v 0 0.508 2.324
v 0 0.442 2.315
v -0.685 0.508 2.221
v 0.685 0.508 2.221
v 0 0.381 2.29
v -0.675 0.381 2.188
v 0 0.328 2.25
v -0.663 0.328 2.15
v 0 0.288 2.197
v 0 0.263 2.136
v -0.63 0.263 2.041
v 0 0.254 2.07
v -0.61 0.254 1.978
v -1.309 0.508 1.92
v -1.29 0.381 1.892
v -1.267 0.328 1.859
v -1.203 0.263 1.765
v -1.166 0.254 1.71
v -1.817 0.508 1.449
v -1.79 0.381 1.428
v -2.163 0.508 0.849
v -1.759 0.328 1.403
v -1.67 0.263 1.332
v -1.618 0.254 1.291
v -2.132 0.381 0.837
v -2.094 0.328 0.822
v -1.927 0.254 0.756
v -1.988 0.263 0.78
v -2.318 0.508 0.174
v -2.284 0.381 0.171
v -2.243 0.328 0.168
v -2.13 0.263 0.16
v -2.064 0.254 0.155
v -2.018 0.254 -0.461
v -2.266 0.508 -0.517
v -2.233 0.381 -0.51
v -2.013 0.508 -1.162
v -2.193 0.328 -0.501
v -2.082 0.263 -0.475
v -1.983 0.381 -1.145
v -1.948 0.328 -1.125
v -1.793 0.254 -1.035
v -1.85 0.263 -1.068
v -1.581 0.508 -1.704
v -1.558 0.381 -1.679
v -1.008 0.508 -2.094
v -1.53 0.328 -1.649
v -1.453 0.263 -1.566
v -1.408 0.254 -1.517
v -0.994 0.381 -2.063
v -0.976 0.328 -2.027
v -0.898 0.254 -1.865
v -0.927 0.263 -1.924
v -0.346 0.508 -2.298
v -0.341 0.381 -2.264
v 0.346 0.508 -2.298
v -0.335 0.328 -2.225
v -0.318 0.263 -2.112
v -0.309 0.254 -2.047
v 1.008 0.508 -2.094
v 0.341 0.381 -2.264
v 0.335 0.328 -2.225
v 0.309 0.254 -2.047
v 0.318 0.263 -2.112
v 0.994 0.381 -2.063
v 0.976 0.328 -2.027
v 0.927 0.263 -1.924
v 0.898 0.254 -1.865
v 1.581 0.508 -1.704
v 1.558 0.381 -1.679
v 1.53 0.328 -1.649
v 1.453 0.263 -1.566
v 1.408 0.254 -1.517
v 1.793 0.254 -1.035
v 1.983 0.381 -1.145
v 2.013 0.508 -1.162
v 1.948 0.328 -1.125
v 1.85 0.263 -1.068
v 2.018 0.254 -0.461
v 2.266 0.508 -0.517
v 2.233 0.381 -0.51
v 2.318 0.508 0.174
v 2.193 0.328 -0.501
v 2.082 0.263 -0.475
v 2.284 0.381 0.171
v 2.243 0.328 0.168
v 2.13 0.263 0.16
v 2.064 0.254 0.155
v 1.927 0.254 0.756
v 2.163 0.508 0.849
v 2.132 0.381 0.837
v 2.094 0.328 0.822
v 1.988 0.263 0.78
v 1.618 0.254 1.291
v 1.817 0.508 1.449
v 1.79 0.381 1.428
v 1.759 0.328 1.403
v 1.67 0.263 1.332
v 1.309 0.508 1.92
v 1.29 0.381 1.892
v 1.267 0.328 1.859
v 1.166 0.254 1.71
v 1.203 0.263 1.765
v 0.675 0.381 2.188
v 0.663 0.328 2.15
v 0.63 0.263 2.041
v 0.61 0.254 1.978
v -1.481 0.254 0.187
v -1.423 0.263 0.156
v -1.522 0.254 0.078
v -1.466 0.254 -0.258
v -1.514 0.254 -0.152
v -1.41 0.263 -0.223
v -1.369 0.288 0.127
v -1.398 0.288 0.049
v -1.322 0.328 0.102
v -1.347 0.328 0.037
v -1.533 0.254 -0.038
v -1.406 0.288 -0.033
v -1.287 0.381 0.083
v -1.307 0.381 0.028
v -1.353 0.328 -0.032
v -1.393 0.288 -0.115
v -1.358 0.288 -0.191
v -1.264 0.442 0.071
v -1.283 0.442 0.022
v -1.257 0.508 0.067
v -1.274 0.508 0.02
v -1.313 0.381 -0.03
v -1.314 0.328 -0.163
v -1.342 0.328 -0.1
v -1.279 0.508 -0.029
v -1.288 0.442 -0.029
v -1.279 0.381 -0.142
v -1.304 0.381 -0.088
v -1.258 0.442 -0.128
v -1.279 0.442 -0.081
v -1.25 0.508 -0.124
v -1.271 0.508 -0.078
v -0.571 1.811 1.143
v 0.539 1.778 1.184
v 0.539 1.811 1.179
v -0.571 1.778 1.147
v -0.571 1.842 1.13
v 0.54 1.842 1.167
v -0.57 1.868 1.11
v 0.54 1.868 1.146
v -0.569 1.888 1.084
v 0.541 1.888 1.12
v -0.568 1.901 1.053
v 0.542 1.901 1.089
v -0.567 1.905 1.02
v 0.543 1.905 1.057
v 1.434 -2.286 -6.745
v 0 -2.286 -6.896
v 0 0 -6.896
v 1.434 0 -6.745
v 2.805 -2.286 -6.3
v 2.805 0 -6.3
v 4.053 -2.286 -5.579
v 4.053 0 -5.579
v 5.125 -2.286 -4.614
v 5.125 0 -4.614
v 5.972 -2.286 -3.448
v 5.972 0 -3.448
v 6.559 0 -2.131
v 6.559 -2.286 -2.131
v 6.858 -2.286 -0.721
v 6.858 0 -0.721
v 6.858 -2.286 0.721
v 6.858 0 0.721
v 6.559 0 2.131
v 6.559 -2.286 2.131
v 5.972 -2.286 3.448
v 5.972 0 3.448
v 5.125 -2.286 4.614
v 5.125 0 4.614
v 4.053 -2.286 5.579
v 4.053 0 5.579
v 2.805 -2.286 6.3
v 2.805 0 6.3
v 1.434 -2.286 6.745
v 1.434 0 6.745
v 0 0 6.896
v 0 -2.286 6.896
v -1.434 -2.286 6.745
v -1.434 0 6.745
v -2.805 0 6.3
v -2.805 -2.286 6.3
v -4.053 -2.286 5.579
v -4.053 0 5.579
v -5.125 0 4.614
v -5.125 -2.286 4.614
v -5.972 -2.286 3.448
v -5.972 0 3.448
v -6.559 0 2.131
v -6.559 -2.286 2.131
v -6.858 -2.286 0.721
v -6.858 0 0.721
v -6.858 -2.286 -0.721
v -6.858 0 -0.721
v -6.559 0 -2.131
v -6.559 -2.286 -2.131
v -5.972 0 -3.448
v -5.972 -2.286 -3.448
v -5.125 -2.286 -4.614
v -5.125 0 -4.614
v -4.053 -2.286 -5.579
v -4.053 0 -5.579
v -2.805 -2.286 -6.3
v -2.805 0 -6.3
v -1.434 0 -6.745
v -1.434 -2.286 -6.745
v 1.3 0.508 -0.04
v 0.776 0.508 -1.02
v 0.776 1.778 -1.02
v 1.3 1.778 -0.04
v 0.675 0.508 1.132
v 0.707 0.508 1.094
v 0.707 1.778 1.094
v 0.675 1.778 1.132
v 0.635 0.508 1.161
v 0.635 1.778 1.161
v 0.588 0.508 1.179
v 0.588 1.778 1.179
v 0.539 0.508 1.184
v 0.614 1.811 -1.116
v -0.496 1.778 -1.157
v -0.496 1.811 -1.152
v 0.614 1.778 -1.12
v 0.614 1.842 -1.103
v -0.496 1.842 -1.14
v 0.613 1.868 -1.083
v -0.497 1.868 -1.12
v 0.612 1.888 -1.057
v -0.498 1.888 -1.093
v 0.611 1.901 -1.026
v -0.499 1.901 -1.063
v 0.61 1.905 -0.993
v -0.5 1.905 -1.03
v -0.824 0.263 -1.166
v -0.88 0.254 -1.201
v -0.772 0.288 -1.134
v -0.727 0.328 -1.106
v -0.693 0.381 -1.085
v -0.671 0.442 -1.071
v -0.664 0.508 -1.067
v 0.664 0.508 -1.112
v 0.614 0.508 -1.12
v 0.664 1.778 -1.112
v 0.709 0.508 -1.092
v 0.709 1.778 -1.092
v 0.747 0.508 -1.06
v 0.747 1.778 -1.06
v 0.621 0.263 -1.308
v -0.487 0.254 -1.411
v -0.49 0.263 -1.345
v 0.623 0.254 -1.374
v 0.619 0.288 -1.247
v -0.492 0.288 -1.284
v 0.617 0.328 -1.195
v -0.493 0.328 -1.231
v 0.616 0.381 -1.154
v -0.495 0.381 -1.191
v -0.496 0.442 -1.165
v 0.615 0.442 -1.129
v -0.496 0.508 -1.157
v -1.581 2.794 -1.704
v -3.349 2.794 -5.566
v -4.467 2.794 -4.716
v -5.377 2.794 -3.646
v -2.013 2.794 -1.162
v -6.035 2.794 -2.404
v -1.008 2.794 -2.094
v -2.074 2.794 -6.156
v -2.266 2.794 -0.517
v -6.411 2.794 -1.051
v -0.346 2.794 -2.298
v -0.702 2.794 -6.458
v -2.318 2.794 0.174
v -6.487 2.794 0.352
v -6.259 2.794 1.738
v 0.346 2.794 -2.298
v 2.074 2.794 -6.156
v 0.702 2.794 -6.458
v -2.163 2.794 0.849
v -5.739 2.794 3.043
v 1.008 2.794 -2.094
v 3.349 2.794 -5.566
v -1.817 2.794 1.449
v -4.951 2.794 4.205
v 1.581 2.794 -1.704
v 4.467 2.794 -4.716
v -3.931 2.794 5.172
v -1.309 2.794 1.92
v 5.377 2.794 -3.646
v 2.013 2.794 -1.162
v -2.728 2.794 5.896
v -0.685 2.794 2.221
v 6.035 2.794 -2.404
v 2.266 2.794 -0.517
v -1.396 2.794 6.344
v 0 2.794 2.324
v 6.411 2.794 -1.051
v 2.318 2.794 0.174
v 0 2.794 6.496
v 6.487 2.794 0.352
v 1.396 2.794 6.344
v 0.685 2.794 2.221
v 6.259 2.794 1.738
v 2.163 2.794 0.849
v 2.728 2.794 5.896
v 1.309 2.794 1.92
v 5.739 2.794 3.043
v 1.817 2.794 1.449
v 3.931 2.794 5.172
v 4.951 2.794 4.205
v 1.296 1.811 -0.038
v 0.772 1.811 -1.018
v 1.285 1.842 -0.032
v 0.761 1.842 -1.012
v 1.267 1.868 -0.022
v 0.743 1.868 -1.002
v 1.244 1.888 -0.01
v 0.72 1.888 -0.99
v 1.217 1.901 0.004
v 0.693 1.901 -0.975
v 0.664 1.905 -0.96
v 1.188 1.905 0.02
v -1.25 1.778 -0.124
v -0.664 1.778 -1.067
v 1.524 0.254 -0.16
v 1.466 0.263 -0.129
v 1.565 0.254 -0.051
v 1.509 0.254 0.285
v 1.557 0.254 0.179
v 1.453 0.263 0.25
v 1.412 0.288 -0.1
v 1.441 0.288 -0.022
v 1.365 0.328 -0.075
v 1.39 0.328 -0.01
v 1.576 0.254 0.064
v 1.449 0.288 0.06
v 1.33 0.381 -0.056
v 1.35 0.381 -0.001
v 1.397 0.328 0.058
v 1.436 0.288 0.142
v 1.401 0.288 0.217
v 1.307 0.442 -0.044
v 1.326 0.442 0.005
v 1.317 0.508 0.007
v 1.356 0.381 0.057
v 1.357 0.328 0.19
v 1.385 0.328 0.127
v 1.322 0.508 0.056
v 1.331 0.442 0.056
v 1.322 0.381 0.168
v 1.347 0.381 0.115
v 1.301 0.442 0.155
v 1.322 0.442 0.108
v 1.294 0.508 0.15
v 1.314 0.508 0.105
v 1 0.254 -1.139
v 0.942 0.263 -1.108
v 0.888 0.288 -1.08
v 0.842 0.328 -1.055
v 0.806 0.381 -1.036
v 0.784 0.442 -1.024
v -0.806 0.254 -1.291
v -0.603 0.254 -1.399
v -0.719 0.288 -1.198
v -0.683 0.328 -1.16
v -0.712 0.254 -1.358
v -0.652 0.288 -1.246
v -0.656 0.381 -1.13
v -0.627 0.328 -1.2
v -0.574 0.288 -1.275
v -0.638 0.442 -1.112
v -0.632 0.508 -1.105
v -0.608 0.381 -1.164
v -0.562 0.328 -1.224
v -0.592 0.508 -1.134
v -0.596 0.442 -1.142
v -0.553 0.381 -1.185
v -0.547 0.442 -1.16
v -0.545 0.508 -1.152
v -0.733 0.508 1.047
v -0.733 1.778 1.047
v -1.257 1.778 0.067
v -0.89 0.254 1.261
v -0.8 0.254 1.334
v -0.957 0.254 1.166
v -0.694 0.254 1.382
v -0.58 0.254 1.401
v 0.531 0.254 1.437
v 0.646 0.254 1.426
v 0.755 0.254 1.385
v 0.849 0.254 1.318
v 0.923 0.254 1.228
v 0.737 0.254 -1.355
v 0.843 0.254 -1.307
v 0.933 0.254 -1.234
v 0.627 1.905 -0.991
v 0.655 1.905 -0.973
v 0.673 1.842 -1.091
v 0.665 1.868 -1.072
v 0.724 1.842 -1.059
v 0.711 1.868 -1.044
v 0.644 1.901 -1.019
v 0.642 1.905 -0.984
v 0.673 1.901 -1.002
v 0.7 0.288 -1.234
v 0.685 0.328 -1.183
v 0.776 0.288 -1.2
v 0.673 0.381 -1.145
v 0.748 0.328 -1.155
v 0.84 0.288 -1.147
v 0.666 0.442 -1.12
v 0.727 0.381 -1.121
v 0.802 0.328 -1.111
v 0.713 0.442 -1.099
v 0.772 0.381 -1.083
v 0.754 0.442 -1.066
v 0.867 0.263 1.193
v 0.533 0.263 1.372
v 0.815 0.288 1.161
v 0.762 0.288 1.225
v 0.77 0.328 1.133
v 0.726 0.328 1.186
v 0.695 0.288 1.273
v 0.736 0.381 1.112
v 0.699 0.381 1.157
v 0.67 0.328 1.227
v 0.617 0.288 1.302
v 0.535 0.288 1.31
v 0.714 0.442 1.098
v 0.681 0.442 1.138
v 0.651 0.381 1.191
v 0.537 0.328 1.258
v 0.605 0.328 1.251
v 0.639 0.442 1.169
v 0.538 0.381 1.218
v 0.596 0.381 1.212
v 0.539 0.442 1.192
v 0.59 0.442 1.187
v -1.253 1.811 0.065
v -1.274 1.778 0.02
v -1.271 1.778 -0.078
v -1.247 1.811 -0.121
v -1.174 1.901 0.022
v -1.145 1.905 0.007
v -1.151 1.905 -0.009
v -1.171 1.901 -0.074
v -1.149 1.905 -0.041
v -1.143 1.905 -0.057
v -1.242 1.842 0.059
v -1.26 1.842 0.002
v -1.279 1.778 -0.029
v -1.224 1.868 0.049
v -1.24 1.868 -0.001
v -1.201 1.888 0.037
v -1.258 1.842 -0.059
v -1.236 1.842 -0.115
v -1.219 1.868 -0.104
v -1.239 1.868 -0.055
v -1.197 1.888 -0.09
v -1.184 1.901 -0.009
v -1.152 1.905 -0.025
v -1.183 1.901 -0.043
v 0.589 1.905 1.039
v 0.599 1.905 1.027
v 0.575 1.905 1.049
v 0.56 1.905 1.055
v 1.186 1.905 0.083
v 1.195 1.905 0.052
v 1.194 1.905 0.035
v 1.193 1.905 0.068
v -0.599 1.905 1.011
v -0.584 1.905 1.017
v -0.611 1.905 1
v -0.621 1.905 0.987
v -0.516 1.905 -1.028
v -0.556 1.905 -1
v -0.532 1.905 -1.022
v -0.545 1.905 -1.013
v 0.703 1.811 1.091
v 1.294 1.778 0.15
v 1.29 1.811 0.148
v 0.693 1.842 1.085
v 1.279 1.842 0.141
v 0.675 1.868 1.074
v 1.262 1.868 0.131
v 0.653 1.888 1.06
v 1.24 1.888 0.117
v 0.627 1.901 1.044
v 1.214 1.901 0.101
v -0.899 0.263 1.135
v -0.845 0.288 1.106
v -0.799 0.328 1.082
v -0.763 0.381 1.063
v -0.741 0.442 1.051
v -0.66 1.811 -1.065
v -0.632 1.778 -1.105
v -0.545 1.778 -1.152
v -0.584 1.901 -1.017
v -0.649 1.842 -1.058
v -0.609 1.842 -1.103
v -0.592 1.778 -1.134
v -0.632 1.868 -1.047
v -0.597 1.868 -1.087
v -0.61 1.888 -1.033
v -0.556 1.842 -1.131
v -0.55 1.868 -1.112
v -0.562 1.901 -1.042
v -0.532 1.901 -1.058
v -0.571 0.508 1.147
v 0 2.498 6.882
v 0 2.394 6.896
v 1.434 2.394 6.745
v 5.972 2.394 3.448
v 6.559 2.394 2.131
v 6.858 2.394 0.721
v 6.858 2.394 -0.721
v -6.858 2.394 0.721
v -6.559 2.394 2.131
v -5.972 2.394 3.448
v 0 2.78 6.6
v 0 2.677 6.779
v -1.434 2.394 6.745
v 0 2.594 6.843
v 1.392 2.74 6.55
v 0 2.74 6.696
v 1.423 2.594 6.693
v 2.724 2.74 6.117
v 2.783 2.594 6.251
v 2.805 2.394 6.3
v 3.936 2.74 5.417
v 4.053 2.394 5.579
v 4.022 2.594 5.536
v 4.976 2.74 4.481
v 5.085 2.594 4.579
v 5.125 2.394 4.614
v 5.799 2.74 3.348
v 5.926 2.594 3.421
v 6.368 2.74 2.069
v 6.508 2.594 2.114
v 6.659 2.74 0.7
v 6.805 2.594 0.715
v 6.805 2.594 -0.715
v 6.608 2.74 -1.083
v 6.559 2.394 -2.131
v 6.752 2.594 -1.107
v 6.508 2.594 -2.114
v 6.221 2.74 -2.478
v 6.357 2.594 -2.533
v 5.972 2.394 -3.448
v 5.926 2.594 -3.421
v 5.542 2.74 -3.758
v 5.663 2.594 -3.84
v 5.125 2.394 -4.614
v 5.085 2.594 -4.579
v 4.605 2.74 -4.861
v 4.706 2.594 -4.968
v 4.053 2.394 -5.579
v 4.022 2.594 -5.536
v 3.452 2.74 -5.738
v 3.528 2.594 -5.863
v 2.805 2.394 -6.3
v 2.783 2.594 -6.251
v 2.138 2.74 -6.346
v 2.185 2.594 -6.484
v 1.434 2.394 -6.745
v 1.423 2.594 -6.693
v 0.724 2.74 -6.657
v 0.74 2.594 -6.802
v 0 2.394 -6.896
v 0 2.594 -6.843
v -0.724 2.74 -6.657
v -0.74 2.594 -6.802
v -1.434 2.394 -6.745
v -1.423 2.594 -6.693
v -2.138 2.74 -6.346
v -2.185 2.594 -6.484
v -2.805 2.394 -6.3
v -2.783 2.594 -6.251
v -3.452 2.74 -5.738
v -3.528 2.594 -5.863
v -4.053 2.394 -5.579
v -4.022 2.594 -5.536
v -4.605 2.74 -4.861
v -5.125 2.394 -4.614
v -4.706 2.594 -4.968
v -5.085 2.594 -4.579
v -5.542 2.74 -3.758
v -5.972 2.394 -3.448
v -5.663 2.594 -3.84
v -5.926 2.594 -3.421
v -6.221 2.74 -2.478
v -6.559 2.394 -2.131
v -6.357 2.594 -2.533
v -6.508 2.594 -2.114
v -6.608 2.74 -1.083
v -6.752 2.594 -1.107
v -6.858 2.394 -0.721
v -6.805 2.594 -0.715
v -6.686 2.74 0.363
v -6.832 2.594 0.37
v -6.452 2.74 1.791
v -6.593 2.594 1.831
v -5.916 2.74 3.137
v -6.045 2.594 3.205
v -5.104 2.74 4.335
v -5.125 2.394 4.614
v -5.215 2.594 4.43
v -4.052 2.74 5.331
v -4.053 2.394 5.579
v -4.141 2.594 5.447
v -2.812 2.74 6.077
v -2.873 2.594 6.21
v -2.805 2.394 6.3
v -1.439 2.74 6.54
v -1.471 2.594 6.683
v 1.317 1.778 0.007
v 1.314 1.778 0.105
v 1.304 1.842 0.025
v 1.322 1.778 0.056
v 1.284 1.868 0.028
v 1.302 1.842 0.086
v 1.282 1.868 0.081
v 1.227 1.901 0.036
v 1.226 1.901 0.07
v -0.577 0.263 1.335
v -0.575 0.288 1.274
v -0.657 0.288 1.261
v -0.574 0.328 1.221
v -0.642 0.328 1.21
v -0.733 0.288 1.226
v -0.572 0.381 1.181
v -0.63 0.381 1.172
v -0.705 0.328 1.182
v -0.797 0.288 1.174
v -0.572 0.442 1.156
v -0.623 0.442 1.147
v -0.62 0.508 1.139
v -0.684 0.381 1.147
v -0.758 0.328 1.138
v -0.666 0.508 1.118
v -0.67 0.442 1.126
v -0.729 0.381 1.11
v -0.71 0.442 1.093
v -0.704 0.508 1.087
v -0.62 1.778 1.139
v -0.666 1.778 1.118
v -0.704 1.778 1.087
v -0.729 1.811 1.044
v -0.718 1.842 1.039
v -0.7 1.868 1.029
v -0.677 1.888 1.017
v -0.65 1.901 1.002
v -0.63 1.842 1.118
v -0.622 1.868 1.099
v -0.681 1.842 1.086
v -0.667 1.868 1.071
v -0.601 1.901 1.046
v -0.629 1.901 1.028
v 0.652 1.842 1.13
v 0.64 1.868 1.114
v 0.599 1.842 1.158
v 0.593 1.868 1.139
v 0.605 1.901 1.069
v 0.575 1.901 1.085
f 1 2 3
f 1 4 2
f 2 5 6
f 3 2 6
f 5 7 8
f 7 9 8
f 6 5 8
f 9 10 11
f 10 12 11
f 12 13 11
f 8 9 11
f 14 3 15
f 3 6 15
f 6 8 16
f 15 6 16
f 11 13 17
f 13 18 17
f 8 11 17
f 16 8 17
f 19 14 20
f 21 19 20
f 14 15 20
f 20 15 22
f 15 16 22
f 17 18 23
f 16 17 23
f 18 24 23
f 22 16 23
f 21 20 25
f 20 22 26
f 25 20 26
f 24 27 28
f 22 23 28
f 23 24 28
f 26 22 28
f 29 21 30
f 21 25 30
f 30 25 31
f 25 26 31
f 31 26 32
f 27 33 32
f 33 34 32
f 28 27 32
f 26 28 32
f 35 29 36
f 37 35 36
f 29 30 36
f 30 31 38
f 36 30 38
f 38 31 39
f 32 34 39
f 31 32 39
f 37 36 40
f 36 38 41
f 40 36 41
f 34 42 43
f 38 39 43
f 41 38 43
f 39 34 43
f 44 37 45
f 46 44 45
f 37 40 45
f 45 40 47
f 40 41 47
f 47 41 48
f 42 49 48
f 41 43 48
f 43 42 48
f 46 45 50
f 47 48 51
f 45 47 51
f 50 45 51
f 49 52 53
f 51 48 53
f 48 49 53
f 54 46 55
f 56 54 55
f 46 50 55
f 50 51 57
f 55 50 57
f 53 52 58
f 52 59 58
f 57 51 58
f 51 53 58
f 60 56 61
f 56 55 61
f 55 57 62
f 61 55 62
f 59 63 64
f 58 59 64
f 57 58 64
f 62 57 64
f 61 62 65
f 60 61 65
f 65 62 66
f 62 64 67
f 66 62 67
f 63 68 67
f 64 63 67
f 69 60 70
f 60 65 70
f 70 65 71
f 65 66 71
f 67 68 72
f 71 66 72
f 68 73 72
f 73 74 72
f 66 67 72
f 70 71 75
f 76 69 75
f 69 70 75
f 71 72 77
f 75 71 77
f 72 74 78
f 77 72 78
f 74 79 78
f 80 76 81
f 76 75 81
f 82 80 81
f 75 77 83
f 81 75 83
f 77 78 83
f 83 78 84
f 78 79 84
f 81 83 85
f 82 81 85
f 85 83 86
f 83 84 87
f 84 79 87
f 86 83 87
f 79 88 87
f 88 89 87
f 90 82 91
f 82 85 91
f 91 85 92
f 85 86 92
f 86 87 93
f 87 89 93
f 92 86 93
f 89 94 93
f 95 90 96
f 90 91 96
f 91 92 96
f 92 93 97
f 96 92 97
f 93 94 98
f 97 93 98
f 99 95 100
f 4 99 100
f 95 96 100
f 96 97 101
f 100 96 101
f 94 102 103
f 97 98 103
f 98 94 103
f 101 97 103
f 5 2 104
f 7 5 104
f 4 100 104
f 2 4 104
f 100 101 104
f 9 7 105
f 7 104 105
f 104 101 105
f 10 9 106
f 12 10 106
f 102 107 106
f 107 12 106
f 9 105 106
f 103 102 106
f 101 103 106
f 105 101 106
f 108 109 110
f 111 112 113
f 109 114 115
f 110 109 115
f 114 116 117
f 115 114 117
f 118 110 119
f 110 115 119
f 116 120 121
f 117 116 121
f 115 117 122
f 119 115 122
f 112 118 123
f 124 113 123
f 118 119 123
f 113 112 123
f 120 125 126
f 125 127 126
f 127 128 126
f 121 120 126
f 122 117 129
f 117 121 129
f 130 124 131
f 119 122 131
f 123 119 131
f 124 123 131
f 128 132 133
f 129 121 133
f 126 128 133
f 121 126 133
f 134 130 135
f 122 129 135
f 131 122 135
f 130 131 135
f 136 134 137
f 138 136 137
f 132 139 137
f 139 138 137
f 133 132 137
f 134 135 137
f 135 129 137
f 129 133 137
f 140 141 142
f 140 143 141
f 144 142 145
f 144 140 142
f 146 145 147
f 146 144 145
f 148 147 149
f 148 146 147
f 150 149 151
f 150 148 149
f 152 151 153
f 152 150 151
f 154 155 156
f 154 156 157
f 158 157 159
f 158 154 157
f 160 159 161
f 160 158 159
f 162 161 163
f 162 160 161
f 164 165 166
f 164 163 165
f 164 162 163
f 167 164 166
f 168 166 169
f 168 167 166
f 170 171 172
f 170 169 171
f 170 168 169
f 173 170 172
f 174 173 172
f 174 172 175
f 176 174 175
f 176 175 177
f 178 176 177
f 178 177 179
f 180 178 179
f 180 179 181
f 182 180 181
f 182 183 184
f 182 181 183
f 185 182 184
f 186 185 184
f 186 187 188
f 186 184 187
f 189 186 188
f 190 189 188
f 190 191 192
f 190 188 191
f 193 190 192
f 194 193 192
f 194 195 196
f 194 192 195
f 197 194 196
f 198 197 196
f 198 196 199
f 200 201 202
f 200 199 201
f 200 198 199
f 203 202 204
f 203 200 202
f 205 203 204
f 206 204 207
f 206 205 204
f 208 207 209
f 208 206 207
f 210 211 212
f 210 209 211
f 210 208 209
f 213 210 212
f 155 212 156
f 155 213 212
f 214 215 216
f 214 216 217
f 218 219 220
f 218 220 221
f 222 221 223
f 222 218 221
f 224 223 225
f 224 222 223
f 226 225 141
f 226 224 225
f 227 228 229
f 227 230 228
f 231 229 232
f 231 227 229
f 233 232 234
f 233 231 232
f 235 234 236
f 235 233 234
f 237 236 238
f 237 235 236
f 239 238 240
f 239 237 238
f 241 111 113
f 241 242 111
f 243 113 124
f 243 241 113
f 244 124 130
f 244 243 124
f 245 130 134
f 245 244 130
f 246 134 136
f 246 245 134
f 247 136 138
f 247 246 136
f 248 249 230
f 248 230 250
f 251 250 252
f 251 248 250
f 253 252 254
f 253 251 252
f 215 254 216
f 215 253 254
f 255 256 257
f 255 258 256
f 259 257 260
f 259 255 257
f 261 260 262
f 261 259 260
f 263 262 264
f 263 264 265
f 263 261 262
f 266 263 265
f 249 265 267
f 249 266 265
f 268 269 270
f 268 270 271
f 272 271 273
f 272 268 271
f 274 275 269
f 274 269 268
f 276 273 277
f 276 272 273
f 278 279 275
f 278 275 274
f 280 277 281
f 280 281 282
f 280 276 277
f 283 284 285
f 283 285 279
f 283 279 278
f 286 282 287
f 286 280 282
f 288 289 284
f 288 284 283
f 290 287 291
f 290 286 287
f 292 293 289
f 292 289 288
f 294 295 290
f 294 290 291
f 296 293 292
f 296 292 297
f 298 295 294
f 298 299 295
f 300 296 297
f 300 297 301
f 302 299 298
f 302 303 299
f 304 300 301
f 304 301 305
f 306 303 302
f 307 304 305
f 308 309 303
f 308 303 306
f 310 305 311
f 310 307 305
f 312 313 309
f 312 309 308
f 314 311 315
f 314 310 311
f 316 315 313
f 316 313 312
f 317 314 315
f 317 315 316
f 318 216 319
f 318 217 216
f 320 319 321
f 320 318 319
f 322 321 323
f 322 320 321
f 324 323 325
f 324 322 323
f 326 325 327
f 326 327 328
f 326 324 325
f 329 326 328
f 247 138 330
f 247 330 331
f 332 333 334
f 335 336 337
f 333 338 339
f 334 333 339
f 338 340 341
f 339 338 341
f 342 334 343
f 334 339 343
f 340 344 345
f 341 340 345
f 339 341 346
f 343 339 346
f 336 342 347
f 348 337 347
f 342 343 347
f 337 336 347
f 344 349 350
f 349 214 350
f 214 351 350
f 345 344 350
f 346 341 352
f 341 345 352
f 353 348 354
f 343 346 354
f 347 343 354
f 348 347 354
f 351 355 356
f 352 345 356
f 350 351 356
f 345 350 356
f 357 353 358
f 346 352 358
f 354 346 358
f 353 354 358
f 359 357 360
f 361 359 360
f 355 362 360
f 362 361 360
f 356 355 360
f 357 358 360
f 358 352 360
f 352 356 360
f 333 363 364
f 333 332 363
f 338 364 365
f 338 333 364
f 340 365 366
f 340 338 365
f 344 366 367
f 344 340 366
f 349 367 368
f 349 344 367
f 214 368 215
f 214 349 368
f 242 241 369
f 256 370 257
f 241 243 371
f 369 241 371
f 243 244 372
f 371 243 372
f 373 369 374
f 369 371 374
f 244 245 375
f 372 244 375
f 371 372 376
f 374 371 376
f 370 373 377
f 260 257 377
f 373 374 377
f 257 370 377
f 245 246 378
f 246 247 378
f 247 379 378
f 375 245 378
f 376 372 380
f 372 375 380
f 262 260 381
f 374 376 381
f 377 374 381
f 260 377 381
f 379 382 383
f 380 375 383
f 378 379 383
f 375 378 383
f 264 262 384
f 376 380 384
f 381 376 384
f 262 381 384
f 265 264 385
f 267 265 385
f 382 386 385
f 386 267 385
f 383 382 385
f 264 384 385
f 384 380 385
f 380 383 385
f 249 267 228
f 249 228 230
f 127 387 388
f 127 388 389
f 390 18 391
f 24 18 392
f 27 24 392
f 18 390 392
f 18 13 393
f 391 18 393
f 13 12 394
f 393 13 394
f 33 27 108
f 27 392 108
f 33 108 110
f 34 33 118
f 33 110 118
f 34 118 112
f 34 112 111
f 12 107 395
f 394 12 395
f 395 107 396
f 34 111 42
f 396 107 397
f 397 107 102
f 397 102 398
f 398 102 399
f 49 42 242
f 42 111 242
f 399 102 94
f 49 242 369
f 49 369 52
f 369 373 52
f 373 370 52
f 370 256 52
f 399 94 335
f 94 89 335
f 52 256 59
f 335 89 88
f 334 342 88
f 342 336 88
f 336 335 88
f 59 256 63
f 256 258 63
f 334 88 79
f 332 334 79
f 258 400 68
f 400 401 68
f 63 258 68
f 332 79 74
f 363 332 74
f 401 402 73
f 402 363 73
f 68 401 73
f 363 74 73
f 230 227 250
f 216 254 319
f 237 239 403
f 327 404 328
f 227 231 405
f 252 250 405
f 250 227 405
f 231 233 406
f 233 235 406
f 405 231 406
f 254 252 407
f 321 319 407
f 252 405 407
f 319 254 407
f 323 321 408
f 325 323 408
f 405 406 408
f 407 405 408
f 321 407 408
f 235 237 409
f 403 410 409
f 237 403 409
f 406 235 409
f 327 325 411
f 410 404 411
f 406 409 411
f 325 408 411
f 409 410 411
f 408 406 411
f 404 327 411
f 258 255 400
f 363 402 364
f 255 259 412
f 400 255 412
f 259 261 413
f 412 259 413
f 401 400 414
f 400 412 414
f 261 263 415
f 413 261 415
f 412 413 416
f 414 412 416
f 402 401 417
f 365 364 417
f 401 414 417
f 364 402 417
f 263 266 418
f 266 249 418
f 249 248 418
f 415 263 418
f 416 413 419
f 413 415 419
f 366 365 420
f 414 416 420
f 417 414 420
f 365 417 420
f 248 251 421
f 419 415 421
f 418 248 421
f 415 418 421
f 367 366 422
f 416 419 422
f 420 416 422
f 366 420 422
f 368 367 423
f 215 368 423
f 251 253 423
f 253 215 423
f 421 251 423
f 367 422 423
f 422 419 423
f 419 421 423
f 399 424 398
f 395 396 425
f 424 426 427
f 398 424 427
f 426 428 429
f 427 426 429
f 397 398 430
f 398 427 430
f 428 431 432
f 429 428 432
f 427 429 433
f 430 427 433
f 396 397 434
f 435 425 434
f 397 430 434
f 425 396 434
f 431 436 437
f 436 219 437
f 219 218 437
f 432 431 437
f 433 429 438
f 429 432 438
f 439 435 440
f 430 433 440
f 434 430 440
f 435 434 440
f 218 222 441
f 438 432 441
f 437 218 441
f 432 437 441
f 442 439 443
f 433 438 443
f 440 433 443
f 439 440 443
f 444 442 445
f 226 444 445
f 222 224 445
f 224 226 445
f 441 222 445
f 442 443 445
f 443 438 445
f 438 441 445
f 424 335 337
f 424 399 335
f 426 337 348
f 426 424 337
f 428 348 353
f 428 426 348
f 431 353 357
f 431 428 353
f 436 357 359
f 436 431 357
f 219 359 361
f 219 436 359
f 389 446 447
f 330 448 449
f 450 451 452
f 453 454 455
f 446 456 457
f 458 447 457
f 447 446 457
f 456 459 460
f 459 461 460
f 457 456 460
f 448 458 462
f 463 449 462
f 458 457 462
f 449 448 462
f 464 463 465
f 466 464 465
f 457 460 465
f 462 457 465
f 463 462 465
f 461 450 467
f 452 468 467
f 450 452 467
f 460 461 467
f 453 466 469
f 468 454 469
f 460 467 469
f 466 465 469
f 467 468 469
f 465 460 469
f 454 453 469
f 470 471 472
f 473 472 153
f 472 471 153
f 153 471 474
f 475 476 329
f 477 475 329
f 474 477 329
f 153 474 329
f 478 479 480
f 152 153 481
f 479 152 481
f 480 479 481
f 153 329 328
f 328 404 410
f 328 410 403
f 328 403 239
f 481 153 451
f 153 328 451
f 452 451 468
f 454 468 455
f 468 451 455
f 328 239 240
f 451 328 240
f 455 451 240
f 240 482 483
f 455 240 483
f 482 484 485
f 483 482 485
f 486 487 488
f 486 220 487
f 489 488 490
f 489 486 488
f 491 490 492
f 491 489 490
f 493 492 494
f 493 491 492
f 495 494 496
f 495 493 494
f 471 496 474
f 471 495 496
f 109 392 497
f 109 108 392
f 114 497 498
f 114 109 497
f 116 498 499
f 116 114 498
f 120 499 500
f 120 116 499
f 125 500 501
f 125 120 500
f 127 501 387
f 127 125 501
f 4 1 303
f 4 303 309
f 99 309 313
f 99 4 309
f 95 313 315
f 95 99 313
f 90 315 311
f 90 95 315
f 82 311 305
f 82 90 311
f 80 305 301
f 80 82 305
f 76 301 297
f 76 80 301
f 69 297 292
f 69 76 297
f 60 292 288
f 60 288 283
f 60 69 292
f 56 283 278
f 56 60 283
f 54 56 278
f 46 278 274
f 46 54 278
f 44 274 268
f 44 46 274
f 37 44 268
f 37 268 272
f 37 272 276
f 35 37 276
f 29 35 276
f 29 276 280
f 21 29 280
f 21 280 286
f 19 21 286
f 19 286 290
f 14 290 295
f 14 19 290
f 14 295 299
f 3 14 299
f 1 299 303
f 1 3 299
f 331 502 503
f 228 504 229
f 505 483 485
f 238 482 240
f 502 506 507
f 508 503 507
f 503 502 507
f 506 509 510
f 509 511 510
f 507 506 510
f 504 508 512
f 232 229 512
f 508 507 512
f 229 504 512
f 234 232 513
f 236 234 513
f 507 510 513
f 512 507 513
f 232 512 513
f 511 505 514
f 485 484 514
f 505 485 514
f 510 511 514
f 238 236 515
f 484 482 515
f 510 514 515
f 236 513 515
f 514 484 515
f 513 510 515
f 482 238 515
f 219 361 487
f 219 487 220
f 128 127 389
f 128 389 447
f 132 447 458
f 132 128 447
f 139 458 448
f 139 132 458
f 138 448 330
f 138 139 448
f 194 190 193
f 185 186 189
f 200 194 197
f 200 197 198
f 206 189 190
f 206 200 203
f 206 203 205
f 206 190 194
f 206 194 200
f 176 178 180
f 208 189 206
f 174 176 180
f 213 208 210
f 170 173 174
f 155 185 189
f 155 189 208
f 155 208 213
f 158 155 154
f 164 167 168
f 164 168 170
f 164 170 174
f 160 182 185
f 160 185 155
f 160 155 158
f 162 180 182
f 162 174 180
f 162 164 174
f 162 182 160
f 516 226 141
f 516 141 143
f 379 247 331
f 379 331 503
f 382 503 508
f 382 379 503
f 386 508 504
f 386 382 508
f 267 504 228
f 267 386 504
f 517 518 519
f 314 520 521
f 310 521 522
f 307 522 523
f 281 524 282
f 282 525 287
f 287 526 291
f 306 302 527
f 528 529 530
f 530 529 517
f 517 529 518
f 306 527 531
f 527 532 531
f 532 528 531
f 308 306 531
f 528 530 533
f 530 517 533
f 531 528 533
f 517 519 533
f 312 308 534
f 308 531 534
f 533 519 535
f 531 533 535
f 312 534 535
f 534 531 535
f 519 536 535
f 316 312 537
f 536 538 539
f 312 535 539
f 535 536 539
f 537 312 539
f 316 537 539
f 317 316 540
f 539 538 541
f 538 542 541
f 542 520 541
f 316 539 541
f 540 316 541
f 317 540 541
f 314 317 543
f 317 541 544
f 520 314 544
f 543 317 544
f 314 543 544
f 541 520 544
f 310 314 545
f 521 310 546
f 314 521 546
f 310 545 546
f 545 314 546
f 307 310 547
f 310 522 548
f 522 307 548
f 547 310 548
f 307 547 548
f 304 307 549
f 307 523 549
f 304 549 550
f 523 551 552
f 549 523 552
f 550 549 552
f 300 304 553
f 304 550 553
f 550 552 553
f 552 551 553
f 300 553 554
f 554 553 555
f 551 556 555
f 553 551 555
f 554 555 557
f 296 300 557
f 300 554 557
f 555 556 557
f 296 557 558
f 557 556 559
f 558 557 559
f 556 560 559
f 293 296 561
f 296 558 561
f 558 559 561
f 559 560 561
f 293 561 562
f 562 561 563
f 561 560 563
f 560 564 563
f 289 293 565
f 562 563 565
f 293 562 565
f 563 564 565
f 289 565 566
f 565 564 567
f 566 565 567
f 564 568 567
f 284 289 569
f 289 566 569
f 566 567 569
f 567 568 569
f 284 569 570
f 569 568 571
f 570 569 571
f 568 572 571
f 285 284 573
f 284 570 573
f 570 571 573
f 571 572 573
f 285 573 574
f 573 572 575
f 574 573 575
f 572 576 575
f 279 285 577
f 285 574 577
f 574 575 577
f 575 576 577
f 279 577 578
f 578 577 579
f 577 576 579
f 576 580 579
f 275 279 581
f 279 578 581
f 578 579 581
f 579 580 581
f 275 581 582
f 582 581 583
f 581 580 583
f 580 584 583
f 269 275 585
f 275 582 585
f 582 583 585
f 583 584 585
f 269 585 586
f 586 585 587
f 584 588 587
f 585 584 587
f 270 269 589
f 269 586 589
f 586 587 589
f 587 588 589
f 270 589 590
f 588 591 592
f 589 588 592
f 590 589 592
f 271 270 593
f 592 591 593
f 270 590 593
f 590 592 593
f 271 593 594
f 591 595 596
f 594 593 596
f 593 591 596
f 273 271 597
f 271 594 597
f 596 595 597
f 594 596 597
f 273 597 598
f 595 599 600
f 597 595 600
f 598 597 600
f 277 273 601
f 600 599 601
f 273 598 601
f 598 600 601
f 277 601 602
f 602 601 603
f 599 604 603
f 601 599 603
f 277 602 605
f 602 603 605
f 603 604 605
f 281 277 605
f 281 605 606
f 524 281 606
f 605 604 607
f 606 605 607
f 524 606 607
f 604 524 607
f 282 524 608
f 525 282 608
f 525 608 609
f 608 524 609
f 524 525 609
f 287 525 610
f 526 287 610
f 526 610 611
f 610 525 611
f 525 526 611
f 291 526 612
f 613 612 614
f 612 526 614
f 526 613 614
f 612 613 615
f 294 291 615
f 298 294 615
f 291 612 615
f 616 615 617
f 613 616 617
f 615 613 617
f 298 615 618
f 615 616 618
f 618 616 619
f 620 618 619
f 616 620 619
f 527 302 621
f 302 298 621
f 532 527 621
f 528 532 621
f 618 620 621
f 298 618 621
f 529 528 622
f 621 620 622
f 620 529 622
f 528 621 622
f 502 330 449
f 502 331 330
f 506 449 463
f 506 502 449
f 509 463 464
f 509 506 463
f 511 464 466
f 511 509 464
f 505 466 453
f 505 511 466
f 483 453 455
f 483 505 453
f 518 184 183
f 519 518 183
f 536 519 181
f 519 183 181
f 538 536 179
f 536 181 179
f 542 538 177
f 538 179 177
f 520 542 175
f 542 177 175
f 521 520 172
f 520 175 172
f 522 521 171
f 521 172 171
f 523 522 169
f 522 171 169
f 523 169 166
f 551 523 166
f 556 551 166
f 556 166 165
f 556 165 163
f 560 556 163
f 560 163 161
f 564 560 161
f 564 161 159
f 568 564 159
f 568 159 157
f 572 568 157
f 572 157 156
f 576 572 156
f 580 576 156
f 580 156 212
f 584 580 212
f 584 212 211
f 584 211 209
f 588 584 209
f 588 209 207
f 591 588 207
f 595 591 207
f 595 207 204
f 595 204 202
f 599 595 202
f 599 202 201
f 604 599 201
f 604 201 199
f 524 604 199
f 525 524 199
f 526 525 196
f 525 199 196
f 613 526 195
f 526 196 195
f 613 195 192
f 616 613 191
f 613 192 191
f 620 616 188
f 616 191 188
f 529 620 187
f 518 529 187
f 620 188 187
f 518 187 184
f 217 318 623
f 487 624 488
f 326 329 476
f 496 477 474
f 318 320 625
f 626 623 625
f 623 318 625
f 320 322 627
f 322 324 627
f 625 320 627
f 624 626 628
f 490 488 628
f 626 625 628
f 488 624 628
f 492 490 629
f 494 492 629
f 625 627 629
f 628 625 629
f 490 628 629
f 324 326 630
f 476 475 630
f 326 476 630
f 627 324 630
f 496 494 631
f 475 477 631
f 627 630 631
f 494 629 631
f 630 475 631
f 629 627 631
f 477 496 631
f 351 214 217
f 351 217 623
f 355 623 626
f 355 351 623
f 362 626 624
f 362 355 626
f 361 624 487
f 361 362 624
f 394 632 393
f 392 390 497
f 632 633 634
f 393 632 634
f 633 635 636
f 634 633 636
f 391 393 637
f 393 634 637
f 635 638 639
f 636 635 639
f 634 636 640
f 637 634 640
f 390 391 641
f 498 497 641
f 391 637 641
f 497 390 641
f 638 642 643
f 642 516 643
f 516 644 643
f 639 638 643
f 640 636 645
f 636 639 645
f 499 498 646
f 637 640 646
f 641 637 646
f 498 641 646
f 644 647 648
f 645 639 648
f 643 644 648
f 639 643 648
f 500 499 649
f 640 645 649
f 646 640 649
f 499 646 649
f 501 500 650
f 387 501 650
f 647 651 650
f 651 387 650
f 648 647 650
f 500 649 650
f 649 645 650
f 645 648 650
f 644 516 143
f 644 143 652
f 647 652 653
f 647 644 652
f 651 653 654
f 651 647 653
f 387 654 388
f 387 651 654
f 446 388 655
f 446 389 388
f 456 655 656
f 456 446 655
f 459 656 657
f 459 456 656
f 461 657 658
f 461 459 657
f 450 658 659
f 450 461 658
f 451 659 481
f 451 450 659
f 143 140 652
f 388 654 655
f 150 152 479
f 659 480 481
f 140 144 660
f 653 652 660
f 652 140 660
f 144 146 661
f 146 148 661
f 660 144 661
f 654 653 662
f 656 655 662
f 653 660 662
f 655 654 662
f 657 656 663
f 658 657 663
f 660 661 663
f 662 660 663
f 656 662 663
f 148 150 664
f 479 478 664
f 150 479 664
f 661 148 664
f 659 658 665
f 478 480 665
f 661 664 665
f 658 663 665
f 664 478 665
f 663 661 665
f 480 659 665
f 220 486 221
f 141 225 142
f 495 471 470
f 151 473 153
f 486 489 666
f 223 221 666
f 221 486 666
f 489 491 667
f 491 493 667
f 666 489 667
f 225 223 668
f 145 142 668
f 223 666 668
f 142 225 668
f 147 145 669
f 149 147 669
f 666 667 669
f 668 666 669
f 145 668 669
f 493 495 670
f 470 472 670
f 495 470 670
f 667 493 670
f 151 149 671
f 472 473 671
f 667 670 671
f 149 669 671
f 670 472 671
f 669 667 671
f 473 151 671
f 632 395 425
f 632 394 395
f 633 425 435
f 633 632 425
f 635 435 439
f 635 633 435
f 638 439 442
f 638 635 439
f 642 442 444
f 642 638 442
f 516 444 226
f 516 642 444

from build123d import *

# Parameters (mm, degrees)
SKETCH1_R           = 6.8961
SKETCH1_R_2         = 2.3241
BOSS_EXTRUDE1_DEPTH = 2.794
SKETCH2_R           = 2.3241
BOSS_EXTRUDE2_DEPTH = 0.254
BOSS_EXTRUDE3_DEPTH = 1.651
BOSS_EXTRUDE4_START = 2.286
SKETCH4_R           = 6.8961
BOSS_EXTRUDE4_DEPTH = 2.286
FILLET1_R           = 0.254
FILLET2_R           = 0.127
FILLET3_R           = 0.4


with BuildPart() as part:
    # Sketch1 → Boss-Extrude1 (new body)
    with BuildSketch(Plane(origin=(0, 0, 0), x_dir=(1, 0, 0), z_dir=(0, 1, 0))):
        with Locations(Location((0, 0, 0), (0, 0, 270))):
            Circle(SKETCH1_R)
        with Locations(Location((0, 0, 0), (0, 0, 270))):
            Circle(SKETCH1_R_2, mode=Mode.SUBTRACT)
    extrude(amount=BOSS_EXTRUDE1_DEPTH)

    # Sketch2 → Boss-Extrude2 (add)
    with BuildSketch(Plane.XZ):
        with Locations(Location((0, 0, 0), (0, 0, 270))):
            Circle(SKETCH2_R)
    extrude(amount=-BOSS_EXTRUDE2_DEPTH)

    # Sketch3 → Boss-Extrude3 (add)
    with BuildSketch(Plane(origin=(0, 0.254, 0), x_dir=(1, 0, 0), z_dir=(0, 1, 0))):
        with BuildLine():
            Line((-0.495805164, 1.156686678), (0.614449488, 1.120298857))
            ThreePointArc((0.614449488, 1.120298857), (0.708812351, 1.091670316), (0.776218716, 1.01969584))
            Line((0.776218716, 1.01969584), (1.299833265, 0.039993196))
            ThreePointArc((1.299833265, 0.039993196), (1.322221652, -0.056041711), (1.293593111, -0.150404573))
            Line((1.293593111, -0.150404573), (0.706953007, -1.093719397))
            ThreePointArc((0.706953007, -1.093719397), (0.634978532, -1.161125762), (0.538943625, -1.183514149))
            Line((0.538943625, -1.183514149), (-0.571311028, -1.147126328))
            ThreePointArc((-0.571311028, -1.147126328), (-0.66567389, -1.118497787), (-0.733080255, -1.046523312))
            Line((-0.733080255, -1.046523312), (-1.256694804, -0.066820667))
            ThreePointArc((-1.256694804, -0.066820667), (-1.279083191, 0.02921424), (-1.25045465, 0.123577102))
            Line((-1.25045465, 0.123577102), (-0.663814546, 1.066891925))
            ThreePointArc((-0.663814546, 1.066891925), (-0.591840071, 1.134298291), (-0.495805164, 1.156686678))
        make_face()
    extrude(amount=BOSS_EXTRUDE3_DEPTH)

    # Sketch4 → Boss-Extrude4 (add)
    with BuildSketch(Plane.XZ.offset(BOSS_EXTRUDE4_START)):
        with Locations(Location((0, 0, 0), (0, 0, 270))):
            Circle(SKETCH4_R)
    extrude(amount=-BOSS_EXTRUDE4_DEPTH)

    # Fillet1
    fillet1_edges = [part.edges().sort_by_distance(p)[0] for p in [
        (0, 0.254, -2.3241),
        (0.708812351, 0.254, -1.091670316),
        (0.059322162, 0.254, -1.138492768),
        (-0.591840071, 0.254, -1.134298291),
        (-0.957134598, 0.254, -0.595234514),
        (-1.279083191, 0.254, -0.02921424),
        (-0.99488753, 0.254, 0.556671989),
        (-0.66567389, 0.254, 1.118497787),
        (-0.016183701, 0.254, 1.165320239),
        (0.634978532, 0.254, 1.161125762),
        (1.000273059, 0.254, 0.622061985),
        (1.322221652, 0.254, 0.056041711),
        (1.038025991, 0.254, -0.529844518),
    ]]
    fillet(fillet1_edges, radius=FILLET1_R)

    # Fillet2
    fillet2_edges = [part.edges().sort_by_distance(p)[0] for p in [
        (0.708812351, 1.905, -1.091670316),
        (0.059322162, 1.905, -1.138492768),
        (-0.591840071, 1.905, -1.134298291),
        (-0.957134598, 1.905, -0.595234514),
        (-1.279083191, 1.905, -0.02921424),
        (-0.99488753, 1.905, 0.556671989),
        (-0.66567389, 1.905, 1.118497787),
        (-0.016183701, 1.905, 1.165320239),
        (0.634978532, 1.905, 1.161125762),
        (1.000273059, 1.905, 0.622061985),
        (1.322221652, 1.905, 0.056041711),
        (1.038025991, 1.905, -0.529844518),
    ]]
    fillet(fillet2_edges, radius=FILLET2_R)

    # Fillet3
    fillet3_edges = [part.edges().sort_by_distance(p)[0] for p in [
        (0, 2.794, -6.8961),
    ]]
    fillet(fillet3_edges, radius=FILLET3_R)


solid = part.part
